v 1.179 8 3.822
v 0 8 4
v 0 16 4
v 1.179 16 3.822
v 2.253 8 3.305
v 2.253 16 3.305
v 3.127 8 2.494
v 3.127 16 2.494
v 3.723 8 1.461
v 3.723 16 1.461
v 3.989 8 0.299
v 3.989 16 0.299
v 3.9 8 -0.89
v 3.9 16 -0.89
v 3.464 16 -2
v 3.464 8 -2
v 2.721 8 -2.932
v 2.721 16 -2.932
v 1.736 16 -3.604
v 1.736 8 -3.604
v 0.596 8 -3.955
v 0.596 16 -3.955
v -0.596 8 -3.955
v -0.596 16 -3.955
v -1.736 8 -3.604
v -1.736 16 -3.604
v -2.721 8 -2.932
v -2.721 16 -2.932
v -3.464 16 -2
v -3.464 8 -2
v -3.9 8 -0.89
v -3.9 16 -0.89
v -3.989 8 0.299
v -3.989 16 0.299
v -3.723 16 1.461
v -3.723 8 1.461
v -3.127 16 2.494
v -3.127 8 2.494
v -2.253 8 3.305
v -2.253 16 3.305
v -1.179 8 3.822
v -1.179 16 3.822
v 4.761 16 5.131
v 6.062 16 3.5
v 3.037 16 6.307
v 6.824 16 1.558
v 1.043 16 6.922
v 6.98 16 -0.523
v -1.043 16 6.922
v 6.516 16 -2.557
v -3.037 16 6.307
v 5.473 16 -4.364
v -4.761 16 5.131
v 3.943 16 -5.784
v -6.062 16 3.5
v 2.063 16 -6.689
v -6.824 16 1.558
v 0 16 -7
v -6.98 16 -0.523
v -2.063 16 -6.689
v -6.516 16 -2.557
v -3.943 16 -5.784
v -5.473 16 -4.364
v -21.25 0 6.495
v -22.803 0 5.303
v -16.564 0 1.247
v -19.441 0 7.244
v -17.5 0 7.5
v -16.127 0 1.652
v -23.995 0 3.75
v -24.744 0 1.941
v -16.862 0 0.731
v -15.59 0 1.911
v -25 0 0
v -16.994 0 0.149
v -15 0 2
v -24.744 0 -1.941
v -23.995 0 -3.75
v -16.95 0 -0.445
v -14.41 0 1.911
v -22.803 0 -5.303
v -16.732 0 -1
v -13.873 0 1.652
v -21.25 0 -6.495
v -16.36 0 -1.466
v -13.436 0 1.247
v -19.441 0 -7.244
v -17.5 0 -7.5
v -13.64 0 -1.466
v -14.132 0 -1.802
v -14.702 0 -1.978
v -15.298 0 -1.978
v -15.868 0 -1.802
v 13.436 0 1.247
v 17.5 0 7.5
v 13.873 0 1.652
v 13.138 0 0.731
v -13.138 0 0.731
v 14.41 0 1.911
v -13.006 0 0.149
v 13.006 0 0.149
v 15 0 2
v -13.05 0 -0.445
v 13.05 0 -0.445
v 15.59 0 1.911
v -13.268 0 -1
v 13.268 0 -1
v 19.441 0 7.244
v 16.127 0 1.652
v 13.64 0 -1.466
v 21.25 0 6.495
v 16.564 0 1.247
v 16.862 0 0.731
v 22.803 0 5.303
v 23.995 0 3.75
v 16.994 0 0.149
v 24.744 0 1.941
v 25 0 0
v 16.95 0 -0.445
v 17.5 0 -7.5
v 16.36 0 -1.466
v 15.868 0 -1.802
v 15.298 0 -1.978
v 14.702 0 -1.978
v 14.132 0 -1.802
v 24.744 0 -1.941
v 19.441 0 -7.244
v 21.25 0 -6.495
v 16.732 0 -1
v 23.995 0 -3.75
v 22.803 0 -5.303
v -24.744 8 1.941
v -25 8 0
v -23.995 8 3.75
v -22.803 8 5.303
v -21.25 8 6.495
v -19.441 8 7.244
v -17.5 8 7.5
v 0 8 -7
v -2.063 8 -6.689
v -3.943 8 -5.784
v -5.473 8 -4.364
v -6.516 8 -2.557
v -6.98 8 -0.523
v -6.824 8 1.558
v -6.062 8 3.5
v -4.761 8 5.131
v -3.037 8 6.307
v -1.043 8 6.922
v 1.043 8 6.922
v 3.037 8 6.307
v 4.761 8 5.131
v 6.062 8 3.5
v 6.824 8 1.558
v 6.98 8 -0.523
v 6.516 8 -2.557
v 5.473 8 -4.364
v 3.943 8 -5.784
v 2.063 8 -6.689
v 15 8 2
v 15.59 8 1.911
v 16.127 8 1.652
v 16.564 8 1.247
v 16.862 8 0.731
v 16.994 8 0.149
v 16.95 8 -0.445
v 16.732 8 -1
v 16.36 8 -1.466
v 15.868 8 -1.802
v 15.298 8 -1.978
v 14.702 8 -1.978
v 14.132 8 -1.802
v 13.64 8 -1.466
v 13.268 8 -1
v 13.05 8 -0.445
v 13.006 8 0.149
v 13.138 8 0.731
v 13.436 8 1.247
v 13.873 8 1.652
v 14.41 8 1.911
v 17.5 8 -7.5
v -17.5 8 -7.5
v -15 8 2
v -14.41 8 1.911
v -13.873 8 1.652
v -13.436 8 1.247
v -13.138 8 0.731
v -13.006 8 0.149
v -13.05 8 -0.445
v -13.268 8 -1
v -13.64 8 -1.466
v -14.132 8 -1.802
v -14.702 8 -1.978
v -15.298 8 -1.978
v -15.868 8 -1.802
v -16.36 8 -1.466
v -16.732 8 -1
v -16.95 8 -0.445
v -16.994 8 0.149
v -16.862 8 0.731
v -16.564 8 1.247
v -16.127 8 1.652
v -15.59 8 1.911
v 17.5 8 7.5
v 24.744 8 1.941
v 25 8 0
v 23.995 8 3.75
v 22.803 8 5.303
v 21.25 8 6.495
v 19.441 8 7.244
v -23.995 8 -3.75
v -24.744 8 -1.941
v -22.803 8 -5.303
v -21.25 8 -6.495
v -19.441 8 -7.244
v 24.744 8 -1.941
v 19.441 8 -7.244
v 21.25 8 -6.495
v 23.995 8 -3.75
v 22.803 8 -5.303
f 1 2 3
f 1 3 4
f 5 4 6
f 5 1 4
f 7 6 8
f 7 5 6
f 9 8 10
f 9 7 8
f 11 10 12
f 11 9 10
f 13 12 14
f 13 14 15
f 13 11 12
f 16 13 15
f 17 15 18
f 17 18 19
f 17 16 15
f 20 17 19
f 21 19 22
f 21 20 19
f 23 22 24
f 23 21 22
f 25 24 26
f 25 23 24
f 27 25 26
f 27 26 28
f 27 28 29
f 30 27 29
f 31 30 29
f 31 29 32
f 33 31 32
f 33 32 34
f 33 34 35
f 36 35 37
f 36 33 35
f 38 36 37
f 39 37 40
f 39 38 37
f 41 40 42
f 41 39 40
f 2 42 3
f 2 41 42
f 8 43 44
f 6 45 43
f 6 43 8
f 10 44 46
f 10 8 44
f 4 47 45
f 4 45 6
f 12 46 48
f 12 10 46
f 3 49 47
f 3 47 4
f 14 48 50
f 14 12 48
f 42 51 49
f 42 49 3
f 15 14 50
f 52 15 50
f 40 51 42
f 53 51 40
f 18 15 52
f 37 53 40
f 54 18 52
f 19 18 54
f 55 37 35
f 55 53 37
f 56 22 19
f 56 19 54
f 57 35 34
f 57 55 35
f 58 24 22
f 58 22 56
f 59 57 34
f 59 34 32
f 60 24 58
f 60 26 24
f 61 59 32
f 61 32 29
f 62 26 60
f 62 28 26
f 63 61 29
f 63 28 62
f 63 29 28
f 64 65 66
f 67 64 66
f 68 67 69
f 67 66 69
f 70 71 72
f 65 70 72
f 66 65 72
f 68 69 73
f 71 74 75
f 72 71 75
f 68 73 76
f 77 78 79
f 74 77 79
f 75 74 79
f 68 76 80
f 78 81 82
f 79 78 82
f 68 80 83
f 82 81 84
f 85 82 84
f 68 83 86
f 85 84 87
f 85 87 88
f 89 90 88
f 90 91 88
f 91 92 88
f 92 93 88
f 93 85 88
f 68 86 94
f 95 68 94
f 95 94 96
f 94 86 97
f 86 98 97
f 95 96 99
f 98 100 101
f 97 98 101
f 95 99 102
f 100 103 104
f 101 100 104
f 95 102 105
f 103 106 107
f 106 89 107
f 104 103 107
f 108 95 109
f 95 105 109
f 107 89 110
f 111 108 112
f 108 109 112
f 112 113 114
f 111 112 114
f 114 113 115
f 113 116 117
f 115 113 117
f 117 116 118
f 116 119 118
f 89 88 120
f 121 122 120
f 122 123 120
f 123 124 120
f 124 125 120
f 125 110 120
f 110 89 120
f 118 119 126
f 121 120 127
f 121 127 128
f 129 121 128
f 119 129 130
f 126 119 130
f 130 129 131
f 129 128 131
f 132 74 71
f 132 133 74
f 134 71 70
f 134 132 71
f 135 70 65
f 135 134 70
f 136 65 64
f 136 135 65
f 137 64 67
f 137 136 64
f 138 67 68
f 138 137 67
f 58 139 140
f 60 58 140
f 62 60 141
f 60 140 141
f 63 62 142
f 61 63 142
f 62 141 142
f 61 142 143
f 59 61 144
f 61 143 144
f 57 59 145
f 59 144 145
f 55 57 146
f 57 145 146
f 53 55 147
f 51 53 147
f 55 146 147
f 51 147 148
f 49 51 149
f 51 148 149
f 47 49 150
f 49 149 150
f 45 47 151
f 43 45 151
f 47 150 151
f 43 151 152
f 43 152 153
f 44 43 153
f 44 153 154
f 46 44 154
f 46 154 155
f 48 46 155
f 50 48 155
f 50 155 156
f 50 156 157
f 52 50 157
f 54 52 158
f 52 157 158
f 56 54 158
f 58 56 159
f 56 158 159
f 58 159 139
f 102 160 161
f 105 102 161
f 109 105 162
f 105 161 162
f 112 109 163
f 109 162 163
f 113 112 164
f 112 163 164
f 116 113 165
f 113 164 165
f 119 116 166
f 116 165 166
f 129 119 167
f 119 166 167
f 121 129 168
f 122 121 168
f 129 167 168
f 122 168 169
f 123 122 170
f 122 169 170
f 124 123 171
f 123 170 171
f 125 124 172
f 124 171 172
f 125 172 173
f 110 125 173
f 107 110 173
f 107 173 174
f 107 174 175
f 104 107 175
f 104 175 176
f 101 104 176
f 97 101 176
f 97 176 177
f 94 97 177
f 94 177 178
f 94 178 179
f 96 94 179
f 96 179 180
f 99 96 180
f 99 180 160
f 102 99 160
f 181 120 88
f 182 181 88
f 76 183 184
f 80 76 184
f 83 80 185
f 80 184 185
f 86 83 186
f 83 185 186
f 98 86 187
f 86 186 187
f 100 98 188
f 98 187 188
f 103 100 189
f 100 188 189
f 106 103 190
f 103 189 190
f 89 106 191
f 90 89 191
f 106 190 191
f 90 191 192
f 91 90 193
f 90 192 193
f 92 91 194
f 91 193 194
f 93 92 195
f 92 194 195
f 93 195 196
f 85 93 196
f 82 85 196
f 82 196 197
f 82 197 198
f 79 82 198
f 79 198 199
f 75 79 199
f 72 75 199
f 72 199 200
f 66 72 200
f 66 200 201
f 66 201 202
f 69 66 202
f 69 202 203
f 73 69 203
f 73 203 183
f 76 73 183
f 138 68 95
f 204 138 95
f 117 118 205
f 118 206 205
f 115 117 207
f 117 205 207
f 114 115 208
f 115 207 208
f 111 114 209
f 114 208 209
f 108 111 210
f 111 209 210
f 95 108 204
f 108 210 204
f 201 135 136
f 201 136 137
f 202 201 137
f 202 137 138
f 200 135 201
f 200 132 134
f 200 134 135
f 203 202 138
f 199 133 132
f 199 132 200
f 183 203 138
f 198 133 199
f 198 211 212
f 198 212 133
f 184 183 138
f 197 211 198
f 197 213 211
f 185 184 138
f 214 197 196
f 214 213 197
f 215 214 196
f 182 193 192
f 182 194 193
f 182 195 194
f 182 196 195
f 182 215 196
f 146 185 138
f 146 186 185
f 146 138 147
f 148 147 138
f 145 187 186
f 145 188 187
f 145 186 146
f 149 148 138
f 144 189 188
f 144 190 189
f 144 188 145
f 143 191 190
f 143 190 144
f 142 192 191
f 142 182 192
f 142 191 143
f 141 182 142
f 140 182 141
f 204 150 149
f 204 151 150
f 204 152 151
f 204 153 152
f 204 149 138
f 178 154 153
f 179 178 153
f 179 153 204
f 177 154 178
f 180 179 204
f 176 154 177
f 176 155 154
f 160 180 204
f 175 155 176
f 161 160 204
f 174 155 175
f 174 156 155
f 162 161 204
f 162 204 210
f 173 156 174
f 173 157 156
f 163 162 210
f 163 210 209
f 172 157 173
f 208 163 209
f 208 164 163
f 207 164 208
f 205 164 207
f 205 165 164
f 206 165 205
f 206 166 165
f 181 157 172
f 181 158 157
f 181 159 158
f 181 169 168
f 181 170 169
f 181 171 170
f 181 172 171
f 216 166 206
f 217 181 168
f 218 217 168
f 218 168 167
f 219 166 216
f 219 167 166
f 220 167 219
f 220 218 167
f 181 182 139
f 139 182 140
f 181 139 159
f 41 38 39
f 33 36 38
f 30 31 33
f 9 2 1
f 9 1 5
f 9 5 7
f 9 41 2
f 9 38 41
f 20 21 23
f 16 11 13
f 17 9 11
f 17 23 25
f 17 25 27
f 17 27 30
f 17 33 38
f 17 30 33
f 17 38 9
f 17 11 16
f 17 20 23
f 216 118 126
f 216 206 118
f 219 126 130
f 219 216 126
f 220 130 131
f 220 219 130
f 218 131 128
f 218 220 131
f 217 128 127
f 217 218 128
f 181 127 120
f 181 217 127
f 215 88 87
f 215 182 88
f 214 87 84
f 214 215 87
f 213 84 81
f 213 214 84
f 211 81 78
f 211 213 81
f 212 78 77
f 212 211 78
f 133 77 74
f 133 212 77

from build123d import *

# Parameters (mm, degrees)
BOSS_EXTRU_1_DEPTH      = 8
CONG_1_R                = 7.5
ENL_V_MAT_EXTRU_1_REACH = 29.299
ESQUISSE2_R             = 2
ESQUISSE3_R             = 7
ESQUISSE3_R_2           = 4
BOSS_EXTRU_2_DEPTH      = 8


with BuildPart() as part:
    # Esquisse1 → Boss.-Extru.1 (new body)
    with BuildSketch(Plane(origin=(0, 0, 0), x_dir=(1, 0, 0), z_dir=(0, 1, 0))):
        Polygon((0, -7.5), (25, -7.5), (25, 7.5), (0, 7.5), (-25, 7.5), (-25, -7.5), align=None)
    extrude(amount=BOSS_EXTRU_1_DEPTH)

    # Congé1
    cong_1_edges = [part.edges().sort_by_distance(p)[0] for p in [
        (-25, 4, 7.5),
        (-25, 4, -7.5),
        (25, 4, -7.5),
        (25, 4, 7.5),
    ]]
    fillet(cong_1_edges, radius=CONG_1_R - 0.0001)  # a hair under: the kernel refuses the full size

    # Esquisse2 → Enlèv. mat.-Extru.1 (cut, up to next)
    with BuildSketch(Plane(origin=(0, 8, 0), x_dir=(1, 0, 0), z_dir=(0, 1, 0)), mode=Mode.PRIVATE) as enl_v_mat_extru_1_sk1:
        with Locations(Location((-15, 0, 0), (0, 0, 270))):
            Circle(ESQUISSE2_R)
    enl_v_mat_extru_1_tool1 = extrude(enl_v_mat_extru_1_sk1.sketch, amount=-ENL_V_MAT_EXTRU_1_REACH, mode=Mode.PRIVATE) & part.part
    # Esquisse2 → Enlèv. mat.-Extru.1 (cut, up to next)
    with BuildSketch(Plane(origin=(0, 8, 0), x_dir=(1, 0, 0), z_dir=(0, 1, 0)), mode=Mode.PRIVATE) as enl_v_mat_extru_1_sk2:
        with Locations(Location((15, 0, 0), (0, 0, 270))):
            Circle(ESQUISSE2_R)
    enl_v_mat_extru_1_tool2 = extrude(enl_v_mat_extru_1_sk2.sketch, amount=-ENL_V_MAT_EXTRU_1_REACH, mode=Mode.PRIVATE) & part.part
    add(enl_v_mat_extru_1_tool1.solids().sort_by_distance((-15, 8, 0))[0], mode=Mode.SUBTRACT)
    add(enl_v_mat_extru_1_tool2.solids().sort_by_distance((15, 8, 0))[0], mode=Mode.SUBTRACT)

    # Esquisse3 → Boss.-Extru.2 (add)
    with BuildSketch(Plane(origin=(0, 8, 0), x_dir=(1, 0, 0), z_dir=(0, 1, 0))):
        with Locations(Location((0, 0, 0), (0, 0, 90))):
            Circle(ESQUISSE3_R)
        with Locations(Location((0, 0, 0), (0, 0, 270))):
            Circle(ESQUISSE3_R_2, mode=Mode.SUBTRACT)
    extrude(amount=BOSS_EXTRU_2_DEPTH)


solid = part.part
